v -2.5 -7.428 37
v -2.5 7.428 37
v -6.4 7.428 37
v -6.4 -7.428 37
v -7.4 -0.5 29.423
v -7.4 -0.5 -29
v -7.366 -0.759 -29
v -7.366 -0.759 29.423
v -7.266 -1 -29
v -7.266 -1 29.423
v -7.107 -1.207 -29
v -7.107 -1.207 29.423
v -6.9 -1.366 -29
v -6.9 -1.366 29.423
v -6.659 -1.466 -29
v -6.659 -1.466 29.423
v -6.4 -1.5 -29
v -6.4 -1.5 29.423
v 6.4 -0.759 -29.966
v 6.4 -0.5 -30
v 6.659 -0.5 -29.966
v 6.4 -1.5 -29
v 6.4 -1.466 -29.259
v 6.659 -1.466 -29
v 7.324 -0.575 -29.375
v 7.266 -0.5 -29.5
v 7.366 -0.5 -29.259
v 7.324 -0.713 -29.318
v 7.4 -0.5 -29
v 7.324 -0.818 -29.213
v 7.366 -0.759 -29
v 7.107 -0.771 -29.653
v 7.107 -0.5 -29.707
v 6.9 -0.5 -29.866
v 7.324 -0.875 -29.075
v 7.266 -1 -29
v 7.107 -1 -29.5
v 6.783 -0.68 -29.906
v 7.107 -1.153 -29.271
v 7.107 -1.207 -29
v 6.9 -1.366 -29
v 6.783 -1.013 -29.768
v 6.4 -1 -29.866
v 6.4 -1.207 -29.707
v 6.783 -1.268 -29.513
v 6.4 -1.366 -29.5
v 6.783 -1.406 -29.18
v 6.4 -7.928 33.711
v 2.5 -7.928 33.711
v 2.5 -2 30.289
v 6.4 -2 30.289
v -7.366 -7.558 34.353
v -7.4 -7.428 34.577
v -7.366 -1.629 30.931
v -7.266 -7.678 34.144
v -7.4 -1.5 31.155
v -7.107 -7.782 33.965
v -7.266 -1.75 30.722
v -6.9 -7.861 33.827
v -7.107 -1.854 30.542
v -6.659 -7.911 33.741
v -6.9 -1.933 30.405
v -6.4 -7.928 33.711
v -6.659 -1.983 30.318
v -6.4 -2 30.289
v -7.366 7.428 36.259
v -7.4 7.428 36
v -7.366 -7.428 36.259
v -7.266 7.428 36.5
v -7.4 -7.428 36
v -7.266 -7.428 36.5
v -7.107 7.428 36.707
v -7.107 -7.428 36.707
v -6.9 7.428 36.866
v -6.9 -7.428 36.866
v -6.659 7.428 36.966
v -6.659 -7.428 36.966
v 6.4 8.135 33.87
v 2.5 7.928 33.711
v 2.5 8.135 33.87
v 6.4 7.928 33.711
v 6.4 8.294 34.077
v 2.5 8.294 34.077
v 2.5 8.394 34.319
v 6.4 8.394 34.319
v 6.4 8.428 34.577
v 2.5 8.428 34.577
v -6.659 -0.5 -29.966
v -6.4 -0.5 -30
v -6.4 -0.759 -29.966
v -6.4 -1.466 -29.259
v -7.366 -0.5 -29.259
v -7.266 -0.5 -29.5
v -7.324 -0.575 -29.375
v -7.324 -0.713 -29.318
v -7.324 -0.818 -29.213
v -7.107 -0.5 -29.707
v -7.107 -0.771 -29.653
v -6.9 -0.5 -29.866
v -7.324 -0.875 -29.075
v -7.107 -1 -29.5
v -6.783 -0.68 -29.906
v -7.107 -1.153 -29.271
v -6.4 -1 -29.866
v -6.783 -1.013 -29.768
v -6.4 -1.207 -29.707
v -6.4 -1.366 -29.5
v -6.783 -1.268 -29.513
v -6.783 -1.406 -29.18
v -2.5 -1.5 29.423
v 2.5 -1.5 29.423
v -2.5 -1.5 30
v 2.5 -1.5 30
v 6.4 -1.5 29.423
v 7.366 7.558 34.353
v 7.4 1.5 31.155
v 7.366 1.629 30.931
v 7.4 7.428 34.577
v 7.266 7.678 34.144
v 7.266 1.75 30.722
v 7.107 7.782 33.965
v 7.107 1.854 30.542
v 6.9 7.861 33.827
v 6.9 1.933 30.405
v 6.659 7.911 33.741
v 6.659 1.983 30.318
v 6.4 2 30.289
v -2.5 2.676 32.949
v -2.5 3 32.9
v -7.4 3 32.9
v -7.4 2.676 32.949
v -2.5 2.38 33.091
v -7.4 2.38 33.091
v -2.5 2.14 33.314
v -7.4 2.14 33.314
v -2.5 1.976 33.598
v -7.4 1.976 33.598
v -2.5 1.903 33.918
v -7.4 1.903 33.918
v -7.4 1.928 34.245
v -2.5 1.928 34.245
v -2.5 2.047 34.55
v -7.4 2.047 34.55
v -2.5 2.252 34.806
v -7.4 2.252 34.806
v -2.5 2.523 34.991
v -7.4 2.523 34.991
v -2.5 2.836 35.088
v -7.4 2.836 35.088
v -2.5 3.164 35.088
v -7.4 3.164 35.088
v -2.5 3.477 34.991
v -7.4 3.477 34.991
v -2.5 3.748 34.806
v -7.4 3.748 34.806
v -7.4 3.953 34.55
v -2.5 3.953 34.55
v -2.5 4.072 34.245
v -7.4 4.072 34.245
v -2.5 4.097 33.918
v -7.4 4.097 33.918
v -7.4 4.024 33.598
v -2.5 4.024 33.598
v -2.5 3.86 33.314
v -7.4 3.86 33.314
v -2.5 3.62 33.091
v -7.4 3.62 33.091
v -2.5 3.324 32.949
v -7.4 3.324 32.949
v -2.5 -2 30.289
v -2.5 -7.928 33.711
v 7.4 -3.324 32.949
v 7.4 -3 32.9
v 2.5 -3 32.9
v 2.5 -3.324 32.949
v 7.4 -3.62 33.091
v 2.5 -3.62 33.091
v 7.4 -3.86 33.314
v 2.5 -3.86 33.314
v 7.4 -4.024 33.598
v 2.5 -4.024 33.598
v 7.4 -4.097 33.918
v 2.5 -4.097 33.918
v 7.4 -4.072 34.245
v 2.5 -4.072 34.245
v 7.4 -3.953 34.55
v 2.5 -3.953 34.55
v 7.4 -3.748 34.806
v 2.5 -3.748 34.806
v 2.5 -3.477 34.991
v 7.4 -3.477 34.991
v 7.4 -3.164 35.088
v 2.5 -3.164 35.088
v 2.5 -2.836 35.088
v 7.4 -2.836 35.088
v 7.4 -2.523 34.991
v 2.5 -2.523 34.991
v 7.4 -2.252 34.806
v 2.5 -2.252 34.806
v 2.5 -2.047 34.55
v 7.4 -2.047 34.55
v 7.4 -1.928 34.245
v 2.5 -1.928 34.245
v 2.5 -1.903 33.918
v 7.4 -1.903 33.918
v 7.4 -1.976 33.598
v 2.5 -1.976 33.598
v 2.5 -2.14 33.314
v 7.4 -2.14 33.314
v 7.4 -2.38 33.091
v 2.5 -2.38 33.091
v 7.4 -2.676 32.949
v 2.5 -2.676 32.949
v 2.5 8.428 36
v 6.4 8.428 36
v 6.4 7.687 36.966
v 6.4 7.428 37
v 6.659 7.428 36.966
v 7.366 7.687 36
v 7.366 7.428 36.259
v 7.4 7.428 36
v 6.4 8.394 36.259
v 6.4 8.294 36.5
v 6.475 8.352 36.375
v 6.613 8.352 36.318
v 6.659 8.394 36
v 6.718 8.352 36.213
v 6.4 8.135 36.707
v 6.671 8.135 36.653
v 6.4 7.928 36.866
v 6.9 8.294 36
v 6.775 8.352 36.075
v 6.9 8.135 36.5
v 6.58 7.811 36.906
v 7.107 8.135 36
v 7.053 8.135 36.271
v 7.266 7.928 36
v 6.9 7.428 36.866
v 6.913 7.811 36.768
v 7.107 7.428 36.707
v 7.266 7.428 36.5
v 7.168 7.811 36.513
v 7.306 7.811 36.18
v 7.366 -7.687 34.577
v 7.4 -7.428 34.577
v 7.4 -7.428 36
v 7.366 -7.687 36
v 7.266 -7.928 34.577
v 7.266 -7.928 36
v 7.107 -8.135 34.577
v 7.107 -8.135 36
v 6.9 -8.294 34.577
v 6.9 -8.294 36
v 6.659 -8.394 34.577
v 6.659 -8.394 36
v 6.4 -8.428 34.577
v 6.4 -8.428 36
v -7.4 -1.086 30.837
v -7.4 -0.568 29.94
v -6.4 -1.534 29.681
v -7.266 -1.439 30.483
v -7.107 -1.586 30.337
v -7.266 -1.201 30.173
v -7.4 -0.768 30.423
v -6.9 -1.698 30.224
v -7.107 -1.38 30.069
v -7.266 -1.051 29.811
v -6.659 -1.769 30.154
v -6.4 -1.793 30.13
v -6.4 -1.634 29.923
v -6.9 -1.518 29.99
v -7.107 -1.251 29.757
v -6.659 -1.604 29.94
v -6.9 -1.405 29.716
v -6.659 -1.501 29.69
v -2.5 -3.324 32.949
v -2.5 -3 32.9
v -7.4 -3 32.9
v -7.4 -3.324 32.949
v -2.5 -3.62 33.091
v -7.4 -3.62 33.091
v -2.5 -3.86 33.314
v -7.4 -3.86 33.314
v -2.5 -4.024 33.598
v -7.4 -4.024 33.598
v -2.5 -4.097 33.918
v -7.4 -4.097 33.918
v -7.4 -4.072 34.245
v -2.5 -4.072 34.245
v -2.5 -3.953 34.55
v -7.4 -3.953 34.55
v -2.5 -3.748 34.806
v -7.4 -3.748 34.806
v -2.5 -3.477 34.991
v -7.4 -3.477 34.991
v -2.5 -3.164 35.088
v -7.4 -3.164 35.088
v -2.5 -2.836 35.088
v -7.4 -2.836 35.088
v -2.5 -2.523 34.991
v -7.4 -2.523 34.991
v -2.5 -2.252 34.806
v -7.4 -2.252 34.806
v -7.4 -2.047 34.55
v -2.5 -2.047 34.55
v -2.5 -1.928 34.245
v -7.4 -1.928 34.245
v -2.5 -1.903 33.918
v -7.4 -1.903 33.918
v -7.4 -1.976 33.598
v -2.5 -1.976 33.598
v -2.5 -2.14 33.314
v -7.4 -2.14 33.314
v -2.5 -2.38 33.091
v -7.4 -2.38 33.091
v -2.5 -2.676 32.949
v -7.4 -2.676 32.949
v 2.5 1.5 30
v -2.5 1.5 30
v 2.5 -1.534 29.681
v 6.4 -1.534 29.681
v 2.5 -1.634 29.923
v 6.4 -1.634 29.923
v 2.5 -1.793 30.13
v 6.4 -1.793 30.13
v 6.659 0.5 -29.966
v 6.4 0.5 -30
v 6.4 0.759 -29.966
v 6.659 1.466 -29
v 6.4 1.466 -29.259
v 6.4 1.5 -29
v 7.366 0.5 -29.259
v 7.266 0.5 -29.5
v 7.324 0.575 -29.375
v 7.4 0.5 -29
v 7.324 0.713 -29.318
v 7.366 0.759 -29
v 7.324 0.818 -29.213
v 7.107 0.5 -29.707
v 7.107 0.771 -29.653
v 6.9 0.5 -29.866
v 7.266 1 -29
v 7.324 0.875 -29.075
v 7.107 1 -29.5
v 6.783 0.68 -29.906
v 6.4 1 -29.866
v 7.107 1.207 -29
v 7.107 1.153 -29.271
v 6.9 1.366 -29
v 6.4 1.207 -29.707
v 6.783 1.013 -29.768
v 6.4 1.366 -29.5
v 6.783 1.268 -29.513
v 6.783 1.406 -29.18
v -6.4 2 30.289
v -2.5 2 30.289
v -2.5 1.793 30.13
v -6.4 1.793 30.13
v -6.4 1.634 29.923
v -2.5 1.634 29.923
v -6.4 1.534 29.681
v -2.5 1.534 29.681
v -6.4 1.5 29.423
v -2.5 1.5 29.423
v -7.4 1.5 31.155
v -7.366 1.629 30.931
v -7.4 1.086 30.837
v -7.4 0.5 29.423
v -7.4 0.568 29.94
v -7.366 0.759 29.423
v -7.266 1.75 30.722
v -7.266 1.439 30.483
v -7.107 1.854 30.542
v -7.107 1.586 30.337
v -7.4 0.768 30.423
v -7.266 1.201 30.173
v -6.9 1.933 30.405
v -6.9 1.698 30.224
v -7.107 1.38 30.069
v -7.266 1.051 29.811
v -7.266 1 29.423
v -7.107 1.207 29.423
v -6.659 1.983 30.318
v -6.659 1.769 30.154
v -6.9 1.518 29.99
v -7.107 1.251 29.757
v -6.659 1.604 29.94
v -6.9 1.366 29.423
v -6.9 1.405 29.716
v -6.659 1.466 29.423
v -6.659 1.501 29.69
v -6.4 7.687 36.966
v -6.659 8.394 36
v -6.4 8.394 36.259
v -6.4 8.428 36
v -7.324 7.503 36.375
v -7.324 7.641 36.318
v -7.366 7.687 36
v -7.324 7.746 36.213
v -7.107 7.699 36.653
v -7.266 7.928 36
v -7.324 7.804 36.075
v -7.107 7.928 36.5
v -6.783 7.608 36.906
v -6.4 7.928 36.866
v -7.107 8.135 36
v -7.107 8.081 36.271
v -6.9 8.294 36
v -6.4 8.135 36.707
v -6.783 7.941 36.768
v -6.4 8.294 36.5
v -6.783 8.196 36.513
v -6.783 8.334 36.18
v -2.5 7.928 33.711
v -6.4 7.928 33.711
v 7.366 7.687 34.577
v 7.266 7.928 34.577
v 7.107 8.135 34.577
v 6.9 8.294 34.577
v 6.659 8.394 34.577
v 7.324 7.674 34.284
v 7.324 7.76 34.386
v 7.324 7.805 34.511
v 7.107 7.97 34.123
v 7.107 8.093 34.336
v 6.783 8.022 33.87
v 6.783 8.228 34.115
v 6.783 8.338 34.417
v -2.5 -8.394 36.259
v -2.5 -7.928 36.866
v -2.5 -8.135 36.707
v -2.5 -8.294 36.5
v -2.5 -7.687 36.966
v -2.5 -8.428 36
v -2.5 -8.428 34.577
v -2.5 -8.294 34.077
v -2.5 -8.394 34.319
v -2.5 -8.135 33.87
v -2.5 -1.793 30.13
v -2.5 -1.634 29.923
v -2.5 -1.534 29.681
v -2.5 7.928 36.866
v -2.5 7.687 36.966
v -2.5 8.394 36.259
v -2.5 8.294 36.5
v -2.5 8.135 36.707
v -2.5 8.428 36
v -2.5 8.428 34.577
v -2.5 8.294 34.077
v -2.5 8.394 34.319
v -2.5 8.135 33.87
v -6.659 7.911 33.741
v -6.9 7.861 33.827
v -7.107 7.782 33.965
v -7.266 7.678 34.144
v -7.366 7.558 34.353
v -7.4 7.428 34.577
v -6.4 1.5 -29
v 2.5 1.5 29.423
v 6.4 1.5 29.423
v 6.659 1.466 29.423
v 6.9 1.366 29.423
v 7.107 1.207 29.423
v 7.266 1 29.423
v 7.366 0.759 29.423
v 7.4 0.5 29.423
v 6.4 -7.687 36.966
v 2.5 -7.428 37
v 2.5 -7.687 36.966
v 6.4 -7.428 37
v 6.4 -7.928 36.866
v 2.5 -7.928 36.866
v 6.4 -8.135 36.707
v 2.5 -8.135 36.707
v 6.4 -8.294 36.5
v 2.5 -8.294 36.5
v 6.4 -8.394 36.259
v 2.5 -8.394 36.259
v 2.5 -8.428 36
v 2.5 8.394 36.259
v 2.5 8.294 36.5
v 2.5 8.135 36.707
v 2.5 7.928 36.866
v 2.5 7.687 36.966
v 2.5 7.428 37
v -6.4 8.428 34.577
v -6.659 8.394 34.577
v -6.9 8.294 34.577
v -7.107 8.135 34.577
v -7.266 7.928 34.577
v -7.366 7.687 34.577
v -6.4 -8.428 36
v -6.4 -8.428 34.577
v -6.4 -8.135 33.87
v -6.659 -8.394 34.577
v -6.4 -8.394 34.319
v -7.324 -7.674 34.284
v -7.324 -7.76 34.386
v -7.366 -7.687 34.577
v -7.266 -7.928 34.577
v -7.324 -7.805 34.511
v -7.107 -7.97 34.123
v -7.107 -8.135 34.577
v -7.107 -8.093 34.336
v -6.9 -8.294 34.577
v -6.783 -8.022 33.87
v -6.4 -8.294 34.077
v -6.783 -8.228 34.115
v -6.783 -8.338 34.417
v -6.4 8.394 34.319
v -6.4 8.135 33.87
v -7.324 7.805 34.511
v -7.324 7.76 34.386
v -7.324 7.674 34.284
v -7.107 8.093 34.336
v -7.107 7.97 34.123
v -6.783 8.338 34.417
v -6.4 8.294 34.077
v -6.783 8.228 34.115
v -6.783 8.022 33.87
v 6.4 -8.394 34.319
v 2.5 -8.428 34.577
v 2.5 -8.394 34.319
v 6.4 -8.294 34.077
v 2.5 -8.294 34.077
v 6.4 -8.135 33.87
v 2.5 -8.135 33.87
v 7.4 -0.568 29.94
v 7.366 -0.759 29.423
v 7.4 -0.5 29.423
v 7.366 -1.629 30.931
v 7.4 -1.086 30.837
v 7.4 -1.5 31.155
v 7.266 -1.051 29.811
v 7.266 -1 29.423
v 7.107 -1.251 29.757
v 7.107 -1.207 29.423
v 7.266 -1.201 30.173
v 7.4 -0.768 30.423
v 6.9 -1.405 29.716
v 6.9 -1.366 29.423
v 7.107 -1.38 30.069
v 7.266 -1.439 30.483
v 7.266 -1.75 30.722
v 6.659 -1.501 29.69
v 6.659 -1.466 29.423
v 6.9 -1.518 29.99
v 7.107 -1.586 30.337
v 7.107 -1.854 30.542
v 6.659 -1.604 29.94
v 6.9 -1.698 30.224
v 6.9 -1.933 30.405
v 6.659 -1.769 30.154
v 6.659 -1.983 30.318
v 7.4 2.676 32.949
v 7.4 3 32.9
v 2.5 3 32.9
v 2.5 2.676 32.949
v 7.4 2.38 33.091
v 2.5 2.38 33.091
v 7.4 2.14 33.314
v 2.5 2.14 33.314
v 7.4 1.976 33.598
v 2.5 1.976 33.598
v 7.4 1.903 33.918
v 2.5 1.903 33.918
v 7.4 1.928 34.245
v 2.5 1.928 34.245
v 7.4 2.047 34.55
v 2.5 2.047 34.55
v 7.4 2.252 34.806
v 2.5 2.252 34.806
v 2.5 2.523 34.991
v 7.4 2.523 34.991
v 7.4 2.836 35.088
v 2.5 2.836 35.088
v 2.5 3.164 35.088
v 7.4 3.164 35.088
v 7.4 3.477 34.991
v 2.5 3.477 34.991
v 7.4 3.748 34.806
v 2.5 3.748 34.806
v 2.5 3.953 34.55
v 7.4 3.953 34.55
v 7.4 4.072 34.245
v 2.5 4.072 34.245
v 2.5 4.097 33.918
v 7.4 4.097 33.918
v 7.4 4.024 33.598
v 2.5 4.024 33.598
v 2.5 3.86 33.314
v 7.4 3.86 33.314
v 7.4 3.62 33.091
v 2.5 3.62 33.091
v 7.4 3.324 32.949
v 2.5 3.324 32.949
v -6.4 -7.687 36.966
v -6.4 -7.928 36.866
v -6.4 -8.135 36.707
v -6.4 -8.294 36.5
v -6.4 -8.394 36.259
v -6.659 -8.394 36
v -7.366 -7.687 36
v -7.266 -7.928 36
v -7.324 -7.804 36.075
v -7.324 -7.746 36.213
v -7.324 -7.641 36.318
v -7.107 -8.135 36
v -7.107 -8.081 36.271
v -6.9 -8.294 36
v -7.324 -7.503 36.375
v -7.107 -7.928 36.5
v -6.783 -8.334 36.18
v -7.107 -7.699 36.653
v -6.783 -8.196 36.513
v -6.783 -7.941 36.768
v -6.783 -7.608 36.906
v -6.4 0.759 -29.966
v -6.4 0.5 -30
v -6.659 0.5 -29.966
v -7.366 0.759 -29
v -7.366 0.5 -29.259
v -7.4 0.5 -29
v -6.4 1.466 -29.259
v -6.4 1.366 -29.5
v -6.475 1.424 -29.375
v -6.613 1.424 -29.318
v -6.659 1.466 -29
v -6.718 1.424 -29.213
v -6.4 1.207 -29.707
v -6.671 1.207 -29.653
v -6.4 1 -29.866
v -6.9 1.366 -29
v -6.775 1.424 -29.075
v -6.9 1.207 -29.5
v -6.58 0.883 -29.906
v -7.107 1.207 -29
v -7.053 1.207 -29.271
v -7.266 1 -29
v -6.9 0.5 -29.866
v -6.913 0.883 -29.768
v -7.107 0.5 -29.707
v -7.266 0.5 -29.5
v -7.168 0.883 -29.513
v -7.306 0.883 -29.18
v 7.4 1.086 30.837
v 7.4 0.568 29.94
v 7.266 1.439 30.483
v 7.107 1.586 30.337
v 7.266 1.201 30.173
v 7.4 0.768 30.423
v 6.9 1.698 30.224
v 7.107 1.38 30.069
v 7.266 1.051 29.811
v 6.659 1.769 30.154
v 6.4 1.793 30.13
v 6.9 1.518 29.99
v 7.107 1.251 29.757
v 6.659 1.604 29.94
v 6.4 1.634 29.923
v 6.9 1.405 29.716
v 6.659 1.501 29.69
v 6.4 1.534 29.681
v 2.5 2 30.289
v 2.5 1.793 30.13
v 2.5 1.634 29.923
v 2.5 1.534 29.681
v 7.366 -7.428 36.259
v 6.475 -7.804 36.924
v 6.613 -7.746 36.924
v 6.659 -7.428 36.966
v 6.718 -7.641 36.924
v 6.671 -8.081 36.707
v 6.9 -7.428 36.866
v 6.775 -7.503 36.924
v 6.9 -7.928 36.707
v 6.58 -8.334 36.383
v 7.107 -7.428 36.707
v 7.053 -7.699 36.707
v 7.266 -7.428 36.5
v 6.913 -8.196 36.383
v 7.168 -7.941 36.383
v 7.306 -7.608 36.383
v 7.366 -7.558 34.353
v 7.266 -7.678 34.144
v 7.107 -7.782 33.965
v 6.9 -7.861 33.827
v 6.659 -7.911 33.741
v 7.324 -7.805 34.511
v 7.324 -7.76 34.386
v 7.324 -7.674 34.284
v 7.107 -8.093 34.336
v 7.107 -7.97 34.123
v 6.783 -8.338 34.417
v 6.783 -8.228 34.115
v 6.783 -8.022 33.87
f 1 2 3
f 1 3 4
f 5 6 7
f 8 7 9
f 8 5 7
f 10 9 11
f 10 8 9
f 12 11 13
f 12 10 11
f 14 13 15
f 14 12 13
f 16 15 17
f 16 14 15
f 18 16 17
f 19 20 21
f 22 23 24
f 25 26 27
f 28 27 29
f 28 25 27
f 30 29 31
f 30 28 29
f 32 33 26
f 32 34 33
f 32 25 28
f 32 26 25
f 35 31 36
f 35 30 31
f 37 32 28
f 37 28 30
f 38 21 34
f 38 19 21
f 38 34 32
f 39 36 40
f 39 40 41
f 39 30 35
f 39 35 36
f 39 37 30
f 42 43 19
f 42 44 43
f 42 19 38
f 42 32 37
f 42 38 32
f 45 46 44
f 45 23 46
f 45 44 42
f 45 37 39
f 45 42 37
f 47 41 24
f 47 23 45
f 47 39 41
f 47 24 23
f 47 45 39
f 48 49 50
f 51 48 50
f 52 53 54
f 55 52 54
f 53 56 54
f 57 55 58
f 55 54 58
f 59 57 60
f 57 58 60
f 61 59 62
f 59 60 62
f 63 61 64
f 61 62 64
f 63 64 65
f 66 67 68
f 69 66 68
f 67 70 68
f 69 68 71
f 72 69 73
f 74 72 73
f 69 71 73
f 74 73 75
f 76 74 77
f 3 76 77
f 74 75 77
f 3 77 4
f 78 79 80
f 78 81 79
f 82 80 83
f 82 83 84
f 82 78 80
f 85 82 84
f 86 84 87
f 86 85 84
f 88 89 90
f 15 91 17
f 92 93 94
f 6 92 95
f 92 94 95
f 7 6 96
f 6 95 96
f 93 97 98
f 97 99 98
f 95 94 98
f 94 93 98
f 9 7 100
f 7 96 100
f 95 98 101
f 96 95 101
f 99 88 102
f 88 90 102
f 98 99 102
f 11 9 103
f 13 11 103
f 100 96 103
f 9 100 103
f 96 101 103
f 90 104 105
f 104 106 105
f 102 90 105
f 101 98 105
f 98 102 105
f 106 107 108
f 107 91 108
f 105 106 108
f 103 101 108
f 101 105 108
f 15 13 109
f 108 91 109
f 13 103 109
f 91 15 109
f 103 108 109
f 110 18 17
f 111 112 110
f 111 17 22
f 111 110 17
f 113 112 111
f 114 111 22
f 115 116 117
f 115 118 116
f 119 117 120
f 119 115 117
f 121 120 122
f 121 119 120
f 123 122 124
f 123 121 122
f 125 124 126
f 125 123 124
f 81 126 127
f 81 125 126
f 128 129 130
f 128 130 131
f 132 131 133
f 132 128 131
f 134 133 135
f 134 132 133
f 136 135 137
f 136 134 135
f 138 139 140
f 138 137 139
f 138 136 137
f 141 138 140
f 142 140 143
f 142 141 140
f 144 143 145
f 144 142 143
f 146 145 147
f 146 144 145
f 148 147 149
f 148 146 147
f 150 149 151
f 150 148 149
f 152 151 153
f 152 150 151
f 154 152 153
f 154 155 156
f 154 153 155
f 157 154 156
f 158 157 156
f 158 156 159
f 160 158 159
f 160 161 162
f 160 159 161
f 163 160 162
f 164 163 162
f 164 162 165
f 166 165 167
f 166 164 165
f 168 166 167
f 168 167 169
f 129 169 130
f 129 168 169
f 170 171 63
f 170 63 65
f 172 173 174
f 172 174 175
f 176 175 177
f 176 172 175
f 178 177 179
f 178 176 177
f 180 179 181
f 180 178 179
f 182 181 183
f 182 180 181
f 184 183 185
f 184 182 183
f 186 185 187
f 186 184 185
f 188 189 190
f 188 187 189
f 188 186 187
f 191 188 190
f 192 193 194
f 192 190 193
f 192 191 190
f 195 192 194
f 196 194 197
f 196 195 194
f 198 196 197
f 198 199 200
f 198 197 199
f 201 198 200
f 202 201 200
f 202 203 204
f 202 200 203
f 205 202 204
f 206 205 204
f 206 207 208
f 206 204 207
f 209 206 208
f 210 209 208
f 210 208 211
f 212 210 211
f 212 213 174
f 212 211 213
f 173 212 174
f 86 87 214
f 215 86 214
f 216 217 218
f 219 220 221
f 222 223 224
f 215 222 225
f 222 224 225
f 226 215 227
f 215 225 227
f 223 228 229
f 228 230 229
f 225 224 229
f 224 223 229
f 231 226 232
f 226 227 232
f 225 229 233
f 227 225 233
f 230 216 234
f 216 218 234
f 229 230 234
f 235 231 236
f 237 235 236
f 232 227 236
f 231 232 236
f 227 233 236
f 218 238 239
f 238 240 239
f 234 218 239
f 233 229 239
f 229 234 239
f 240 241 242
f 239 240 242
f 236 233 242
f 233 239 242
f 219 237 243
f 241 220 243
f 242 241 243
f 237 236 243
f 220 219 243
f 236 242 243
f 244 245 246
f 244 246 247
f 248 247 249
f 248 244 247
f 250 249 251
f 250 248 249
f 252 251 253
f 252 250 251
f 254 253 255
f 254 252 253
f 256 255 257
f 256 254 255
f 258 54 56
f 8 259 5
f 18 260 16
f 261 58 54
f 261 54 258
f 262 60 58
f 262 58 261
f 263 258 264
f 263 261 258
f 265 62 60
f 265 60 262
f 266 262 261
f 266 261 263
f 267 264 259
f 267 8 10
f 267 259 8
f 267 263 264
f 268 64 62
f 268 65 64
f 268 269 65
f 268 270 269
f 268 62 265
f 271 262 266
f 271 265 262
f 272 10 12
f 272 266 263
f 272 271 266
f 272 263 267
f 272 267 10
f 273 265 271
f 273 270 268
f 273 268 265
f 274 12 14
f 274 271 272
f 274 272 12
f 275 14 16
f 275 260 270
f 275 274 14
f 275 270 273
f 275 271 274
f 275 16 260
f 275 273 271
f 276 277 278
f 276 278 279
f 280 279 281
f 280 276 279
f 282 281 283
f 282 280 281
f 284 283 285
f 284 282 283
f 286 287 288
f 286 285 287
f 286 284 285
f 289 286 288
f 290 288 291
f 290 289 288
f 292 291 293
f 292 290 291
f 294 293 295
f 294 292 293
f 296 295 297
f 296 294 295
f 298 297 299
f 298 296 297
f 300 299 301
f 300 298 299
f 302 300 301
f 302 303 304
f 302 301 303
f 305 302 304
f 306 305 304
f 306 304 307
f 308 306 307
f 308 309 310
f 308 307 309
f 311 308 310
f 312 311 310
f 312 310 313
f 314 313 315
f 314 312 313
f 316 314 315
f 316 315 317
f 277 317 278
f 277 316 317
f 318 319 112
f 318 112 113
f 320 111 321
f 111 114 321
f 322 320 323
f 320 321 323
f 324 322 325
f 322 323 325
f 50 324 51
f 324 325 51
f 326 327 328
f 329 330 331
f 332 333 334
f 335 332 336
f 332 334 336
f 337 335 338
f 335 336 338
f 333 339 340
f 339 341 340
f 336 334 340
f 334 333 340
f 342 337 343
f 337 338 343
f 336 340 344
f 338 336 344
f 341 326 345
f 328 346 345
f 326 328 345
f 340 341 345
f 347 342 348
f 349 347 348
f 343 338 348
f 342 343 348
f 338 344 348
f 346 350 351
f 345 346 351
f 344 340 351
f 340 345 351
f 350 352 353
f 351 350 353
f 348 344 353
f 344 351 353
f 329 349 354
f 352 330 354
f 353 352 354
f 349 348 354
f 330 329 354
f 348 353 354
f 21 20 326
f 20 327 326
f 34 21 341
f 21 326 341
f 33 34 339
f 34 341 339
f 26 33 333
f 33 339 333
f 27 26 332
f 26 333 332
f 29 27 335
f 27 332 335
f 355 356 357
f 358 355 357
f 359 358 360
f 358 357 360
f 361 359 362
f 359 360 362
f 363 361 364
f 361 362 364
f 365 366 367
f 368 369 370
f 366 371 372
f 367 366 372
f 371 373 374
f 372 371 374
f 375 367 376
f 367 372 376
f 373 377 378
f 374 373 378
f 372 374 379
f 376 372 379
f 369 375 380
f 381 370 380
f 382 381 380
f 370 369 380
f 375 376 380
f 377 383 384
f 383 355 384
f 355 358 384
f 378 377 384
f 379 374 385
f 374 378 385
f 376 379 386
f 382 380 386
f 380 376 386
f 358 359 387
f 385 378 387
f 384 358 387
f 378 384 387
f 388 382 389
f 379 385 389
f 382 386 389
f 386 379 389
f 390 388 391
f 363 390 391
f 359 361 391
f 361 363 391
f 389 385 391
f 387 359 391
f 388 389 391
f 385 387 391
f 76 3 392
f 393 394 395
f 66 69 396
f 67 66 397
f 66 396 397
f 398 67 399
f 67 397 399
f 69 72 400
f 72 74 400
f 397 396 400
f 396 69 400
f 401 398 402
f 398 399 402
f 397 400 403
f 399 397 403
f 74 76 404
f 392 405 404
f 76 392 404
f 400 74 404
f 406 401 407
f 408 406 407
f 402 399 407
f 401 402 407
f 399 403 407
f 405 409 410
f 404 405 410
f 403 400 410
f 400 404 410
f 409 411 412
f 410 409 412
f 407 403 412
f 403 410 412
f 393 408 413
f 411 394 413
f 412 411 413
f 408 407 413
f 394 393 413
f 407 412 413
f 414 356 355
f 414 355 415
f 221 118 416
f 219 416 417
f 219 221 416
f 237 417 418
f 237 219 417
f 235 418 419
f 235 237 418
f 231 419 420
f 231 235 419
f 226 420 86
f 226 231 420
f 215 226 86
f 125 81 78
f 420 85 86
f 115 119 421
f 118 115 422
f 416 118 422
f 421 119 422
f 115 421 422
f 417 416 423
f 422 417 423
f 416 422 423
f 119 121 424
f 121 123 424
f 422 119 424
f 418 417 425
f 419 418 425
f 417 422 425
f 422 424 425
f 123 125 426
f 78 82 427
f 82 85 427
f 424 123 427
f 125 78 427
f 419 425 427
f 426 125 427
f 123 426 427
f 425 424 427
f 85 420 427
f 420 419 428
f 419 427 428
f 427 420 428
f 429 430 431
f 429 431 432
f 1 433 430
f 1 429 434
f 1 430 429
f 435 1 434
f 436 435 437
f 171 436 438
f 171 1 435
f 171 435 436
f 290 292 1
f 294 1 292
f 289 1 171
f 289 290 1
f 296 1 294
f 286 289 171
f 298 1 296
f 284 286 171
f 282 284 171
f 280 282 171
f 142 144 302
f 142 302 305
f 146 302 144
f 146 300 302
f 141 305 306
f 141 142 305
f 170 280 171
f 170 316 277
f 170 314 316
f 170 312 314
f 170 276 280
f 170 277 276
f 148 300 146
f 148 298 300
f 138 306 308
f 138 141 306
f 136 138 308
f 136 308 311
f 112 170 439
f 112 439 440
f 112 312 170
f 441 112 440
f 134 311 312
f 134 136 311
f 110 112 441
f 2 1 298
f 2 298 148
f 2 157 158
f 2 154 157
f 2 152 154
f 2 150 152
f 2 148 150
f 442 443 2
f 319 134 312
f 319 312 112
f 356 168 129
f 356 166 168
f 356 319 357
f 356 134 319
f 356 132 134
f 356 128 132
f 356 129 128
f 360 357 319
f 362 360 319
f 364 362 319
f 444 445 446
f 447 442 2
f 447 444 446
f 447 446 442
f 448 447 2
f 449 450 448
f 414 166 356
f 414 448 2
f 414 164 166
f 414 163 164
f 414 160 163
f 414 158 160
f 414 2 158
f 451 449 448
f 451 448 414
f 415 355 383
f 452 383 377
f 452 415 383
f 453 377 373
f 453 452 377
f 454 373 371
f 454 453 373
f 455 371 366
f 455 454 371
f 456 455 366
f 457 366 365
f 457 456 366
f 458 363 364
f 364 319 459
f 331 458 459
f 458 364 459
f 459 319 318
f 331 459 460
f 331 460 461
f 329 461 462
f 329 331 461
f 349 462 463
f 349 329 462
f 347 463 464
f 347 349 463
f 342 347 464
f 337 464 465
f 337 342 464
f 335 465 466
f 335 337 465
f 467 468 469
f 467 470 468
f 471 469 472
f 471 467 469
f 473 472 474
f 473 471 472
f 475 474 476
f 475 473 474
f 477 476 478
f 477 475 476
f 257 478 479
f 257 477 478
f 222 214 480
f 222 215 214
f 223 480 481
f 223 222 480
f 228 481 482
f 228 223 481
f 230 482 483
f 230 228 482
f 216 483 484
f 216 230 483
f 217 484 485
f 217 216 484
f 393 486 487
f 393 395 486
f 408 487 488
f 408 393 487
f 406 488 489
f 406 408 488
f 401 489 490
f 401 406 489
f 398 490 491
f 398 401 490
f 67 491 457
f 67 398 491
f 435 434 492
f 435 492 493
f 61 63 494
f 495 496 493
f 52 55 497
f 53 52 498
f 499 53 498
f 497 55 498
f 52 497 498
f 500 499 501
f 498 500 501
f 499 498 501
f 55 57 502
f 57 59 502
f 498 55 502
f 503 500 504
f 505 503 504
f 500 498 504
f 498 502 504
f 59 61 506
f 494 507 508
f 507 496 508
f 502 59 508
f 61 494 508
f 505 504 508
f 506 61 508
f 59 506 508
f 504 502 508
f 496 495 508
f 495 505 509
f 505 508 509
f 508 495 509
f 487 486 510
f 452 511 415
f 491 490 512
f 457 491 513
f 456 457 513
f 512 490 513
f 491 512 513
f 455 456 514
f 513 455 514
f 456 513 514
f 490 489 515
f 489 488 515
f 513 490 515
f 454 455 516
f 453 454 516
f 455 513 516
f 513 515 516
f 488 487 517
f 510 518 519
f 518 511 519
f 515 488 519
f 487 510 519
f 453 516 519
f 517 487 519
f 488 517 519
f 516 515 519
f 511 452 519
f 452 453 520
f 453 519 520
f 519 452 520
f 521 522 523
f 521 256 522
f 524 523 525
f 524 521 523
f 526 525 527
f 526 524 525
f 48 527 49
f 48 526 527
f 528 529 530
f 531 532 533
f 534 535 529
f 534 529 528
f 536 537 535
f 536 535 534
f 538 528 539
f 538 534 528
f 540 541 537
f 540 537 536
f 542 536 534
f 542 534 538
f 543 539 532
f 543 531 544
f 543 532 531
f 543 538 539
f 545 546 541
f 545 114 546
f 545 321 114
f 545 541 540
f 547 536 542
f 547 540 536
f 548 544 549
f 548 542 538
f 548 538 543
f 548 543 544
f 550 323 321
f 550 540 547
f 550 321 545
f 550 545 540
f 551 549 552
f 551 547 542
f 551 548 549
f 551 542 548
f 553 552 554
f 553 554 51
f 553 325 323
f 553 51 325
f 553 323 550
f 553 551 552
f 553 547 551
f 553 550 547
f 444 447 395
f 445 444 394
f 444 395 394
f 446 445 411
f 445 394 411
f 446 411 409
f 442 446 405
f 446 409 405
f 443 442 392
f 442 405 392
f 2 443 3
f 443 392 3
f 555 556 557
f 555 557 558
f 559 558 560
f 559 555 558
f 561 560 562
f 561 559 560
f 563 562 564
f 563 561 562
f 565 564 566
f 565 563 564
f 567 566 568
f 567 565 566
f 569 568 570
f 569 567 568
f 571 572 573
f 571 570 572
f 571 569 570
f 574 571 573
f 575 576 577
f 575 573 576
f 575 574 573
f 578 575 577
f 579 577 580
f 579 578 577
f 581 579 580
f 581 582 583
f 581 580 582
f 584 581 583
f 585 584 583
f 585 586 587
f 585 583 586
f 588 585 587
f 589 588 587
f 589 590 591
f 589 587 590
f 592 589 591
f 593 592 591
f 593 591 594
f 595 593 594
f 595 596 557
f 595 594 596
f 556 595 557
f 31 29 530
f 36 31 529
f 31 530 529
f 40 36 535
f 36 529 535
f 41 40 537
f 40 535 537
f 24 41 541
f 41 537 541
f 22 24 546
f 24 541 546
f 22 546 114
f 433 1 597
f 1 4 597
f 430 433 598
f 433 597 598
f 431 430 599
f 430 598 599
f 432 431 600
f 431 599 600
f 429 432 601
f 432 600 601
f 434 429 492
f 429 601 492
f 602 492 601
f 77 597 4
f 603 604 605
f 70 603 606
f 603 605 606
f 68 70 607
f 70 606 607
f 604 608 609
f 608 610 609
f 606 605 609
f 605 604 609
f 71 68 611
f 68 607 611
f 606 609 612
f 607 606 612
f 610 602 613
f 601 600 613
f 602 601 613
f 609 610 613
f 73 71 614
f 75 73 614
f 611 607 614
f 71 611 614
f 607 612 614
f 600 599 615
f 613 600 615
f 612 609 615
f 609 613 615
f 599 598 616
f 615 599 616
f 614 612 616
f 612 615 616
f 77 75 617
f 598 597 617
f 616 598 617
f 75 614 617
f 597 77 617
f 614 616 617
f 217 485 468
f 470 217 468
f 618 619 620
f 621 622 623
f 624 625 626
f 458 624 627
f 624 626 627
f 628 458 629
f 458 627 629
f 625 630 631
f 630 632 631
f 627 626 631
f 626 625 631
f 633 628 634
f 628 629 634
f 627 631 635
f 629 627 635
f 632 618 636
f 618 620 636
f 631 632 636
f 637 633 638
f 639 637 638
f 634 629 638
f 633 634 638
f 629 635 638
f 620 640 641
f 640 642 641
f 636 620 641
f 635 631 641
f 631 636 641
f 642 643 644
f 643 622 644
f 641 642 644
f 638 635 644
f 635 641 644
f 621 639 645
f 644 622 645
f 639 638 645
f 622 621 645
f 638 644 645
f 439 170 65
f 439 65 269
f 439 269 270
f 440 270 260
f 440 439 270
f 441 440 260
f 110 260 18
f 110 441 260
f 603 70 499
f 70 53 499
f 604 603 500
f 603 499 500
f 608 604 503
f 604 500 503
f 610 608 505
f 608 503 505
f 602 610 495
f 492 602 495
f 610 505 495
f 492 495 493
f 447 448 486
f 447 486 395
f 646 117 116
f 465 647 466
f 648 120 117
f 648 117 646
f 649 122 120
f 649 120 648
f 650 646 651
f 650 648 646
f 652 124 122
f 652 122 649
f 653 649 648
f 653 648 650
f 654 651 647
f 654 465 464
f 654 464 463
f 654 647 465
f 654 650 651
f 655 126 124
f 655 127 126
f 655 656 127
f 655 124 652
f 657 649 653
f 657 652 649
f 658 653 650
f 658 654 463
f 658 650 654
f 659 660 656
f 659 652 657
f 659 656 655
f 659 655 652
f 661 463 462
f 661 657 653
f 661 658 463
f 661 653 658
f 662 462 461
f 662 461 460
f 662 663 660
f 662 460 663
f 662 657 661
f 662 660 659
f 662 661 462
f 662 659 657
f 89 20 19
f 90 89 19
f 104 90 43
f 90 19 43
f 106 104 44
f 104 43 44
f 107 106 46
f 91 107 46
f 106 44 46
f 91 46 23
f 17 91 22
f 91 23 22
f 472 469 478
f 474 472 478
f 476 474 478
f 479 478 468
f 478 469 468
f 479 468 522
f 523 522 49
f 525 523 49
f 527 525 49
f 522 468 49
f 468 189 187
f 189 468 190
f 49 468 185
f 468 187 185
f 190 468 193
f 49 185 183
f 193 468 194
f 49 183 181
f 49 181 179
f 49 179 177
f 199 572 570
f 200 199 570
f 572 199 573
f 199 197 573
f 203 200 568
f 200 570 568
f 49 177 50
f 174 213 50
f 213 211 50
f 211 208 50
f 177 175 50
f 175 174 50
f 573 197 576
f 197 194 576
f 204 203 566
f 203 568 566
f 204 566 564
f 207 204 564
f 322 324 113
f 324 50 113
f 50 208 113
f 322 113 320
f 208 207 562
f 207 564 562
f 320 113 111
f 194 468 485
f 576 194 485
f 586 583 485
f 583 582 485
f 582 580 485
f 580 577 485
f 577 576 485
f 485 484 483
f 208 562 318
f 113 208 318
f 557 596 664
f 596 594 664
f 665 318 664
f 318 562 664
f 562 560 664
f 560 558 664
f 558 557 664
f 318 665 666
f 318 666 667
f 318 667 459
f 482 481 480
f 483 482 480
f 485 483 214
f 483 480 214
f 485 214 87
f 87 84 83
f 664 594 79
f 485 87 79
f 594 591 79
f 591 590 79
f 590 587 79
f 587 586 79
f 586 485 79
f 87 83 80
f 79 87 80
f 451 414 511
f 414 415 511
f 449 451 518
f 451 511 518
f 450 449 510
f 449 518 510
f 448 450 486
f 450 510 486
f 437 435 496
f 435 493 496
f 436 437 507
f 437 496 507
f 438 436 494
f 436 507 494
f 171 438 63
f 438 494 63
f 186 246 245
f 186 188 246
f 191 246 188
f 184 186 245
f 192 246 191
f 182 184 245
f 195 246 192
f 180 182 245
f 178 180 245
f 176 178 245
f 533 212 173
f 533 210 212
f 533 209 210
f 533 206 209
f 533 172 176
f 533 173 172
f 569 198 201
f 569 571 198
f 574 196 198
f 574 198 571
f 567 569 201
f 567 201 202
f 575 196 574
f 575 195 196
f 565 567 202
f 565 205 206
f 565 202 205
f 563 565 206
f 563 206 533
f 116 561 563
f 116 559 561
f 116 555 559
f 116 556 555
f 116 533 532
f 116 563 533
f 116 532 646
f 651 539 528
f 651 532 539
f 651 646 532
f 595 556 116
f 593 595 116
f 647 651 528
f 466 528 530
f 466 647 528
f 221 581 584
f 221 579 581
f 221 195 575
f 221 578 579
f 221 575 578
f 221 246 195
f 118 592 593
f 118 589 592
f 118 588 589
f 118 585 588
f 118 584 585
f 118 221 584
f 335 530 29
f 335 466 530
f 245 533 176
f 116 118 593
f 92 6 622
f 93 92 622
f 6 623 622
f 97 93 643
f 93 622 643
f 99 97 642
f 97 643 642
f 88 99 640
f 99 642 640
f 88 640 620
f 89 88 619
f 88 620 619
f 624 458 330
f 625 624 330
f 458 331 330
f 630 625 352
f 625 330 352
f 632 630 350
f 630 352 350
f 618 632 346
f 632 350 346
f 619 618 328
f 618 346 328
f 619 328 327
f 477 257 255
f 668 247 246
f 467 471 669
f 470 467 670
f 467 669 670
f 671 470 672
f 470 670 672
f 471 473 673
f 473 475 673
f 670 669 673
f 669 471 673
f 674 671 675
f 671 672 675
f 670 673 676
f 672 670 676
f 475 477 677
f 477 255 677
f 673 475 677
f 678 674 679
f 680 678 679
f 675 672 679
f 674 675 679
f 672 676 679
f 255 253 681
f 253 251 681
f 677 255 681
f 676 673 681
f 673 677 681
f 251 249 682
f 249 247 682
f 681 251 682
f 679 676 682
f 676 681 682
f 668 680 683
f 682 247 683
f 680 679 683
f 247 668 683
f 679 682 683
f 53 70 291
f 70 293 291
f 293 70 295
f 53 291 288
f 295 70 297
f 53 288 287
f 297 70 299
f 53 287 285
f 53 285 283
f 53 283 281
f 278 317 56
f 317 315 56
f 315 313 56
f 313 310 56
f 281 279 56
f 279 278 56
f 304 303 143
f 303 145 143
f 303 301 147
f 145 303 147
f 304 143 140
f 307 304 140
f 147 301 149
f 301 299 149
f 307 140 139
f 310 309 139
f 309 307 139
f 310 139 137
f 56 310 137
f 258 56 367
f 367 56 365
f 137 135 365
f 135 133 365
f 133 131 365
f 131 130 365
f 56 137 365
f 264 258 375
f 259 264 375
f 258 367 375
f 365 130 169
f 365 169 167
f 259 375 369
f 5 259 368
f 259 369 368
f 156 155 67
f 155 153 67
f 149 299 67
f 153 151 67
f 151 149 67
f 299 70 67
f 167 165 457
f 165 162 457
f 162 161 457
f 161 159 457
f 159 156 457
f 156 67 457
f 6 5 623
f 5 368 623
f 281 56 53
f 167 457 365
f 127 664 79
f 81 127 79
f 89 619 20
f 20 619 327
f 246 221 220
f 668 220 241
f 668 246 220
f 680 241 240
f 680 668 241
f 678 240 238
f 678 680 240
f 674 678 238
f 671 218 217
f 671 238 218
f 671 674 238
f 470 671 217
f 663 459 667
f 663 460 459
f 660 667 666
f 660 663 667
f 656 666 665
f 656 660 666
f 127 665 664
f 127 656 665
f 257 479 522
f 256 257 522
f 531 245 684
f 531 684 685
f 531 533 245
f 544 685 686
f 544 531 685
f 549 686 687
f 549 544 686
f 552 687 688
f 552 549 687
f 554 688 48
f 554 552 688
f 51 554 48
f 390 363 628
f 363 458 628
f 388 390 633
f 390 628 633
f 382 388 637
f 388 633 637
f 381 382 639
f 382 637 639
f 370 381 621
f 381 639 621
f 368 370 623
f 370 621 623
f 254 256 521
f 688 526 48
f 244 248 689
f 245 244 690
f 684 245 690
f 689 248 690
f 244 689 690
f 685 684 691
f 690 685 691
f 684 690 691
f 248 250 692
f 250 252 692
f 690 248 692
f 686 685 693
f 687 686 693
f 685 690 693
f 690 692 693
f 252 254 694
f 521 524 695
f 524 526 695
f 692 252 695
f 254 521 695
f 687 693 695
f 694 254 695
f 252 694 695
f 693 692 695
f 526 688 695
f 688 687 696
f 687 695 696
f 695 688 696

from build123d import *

# Parameters (mm, degrees)
SKETCH_1_W               = 14.8
SKETCH_1_H               = 3
EXTRUDE_1_DEPTH          = 30
EXTRUDE_START            = 2.5
EXTRUDE_2_DEPTH          = 4.9
EXTRUDE_START_2          = -2.5
EXTRUDE_3_DEPTH          = 4.9
FILLET_1_R               = 1
CUT_EXTRUDE_1_DEPTH      = 41.731739622
CUT_EXTRUDE_1_DEPTH_BACK = 41.731739622
SKETCH_4_R               = 1.1


with BuildPart() as part:
    # Эскиз1 → Бобышка-Вытянуть1 (new, symmetric)
    with BuildSketch(Plane.XY):
        Rectangle(SKETCH_1_W, SKETCH_1_H)
    extrude(amount=EXTRUDE_1_DEPTH, both=True)

    # Эскиз3 → Бобышка-Вытянуть2 (add)
    with BuildSketch(Plane(origin=(0, 0, 0), x_dir=(0, 0, -1), z_dir=(1, 0, 0)).offset(EXTRUDE_START)):
        Polygon((-30, 1.5), (-34, 8.42820323), (-37, 8.42820323), (-37, -8.42820323), (-34, -8.42820323), (-30, -1.5), align=None)
    extrude(amount=EXTRUDE_2_DEPTH)

    # Эскиз3<2> → Бобышка-Вытянуть3 (add)
    with BuildSketch(Plane(origin=(0, 0, 0), x_dir=(0, 0, -1), z_dir=(1, 0, 0)).offset(EXTRUDE_START_2)):
        Polygon((-30, 1.5), (-34, 8.42820323), (-37, 8.42820323), (-37, -8.42820323), (-34, -8.42820323), (-30, -1.5), align=None)
    extrude(amount=-EXTRUDE_3_DEPTH)

    # Скругление1
    fillet_1_edges = [part.edges().sort_by_distance(p)[0] for p in [
        (7.4, -4.964101615, 32),
        (4.95, -8.42820323, 34),
        (7.4, -8.42820323, 35.5),
        (4.95, -8.42820323, 37),
        (7.4, 0, 37),
        (4.95, 8.42820323, 37),
        (7.4, 8.42820323, 35.5),
        (4.95, 8.42820323, 34),
        (7.4, 4.964101615, 32),
        (-4.95, -1.5, 30),
        (4.95, -1.5, 30),
        (-4.95, 1.5, 30),
        (-4.95, -8.42820323, 34),
        (-4.95, -8.42820323, 37),
        (-4.95, 8.42820323, 37),
        (-4.95, 8.42820323, 34),
        (-7.4, -4.964101615, 32),
        (-7.4, -8.42820323, 35.5),
        (-7.4, 0, 37),
        (-7.4, 8.42820323, 35.5),
        (-7.4, 4.964101615, 32),
        (0, -1.5, -30),
        (-7.4, 0, -30),
        (0, 1.5, -30),
        (7.4, 0, -30),
        (7.4, -1.5, 0),
        (-7.4, -1.5, 0),
        (-7.4, 1.5, 0),
        (7.4, 1.5, 0),
        (4.95, 1.5, 30),
    ]]
    fillet(fillet_1_edges, radius=FILLET_1_R)

    # Эскиз4 → Вырез-Вытянуть1 (cut, two sides: drawn at the far end of the back side and taken through both)
    with BuildSketch(Plane.ZY.offset(7.4).offset(-CUT_EXTRUDE_1_DEPTH_BACK)):
        with Locations(Location((34, 3, 0), (0, 0, 180))):
            Circle(SKETCH_4_R)
        with Locations(Location((34, -3, 0), (0, 0, 180))):
            Circle(SKETCH_4_R)
    extrude(amount=CUT_EXTRUDE_1_DEPTH + CUT_EXTRUDE_1_DEPTH_BACK, mode=Mode.SUBTRACT)


solid = part.part
